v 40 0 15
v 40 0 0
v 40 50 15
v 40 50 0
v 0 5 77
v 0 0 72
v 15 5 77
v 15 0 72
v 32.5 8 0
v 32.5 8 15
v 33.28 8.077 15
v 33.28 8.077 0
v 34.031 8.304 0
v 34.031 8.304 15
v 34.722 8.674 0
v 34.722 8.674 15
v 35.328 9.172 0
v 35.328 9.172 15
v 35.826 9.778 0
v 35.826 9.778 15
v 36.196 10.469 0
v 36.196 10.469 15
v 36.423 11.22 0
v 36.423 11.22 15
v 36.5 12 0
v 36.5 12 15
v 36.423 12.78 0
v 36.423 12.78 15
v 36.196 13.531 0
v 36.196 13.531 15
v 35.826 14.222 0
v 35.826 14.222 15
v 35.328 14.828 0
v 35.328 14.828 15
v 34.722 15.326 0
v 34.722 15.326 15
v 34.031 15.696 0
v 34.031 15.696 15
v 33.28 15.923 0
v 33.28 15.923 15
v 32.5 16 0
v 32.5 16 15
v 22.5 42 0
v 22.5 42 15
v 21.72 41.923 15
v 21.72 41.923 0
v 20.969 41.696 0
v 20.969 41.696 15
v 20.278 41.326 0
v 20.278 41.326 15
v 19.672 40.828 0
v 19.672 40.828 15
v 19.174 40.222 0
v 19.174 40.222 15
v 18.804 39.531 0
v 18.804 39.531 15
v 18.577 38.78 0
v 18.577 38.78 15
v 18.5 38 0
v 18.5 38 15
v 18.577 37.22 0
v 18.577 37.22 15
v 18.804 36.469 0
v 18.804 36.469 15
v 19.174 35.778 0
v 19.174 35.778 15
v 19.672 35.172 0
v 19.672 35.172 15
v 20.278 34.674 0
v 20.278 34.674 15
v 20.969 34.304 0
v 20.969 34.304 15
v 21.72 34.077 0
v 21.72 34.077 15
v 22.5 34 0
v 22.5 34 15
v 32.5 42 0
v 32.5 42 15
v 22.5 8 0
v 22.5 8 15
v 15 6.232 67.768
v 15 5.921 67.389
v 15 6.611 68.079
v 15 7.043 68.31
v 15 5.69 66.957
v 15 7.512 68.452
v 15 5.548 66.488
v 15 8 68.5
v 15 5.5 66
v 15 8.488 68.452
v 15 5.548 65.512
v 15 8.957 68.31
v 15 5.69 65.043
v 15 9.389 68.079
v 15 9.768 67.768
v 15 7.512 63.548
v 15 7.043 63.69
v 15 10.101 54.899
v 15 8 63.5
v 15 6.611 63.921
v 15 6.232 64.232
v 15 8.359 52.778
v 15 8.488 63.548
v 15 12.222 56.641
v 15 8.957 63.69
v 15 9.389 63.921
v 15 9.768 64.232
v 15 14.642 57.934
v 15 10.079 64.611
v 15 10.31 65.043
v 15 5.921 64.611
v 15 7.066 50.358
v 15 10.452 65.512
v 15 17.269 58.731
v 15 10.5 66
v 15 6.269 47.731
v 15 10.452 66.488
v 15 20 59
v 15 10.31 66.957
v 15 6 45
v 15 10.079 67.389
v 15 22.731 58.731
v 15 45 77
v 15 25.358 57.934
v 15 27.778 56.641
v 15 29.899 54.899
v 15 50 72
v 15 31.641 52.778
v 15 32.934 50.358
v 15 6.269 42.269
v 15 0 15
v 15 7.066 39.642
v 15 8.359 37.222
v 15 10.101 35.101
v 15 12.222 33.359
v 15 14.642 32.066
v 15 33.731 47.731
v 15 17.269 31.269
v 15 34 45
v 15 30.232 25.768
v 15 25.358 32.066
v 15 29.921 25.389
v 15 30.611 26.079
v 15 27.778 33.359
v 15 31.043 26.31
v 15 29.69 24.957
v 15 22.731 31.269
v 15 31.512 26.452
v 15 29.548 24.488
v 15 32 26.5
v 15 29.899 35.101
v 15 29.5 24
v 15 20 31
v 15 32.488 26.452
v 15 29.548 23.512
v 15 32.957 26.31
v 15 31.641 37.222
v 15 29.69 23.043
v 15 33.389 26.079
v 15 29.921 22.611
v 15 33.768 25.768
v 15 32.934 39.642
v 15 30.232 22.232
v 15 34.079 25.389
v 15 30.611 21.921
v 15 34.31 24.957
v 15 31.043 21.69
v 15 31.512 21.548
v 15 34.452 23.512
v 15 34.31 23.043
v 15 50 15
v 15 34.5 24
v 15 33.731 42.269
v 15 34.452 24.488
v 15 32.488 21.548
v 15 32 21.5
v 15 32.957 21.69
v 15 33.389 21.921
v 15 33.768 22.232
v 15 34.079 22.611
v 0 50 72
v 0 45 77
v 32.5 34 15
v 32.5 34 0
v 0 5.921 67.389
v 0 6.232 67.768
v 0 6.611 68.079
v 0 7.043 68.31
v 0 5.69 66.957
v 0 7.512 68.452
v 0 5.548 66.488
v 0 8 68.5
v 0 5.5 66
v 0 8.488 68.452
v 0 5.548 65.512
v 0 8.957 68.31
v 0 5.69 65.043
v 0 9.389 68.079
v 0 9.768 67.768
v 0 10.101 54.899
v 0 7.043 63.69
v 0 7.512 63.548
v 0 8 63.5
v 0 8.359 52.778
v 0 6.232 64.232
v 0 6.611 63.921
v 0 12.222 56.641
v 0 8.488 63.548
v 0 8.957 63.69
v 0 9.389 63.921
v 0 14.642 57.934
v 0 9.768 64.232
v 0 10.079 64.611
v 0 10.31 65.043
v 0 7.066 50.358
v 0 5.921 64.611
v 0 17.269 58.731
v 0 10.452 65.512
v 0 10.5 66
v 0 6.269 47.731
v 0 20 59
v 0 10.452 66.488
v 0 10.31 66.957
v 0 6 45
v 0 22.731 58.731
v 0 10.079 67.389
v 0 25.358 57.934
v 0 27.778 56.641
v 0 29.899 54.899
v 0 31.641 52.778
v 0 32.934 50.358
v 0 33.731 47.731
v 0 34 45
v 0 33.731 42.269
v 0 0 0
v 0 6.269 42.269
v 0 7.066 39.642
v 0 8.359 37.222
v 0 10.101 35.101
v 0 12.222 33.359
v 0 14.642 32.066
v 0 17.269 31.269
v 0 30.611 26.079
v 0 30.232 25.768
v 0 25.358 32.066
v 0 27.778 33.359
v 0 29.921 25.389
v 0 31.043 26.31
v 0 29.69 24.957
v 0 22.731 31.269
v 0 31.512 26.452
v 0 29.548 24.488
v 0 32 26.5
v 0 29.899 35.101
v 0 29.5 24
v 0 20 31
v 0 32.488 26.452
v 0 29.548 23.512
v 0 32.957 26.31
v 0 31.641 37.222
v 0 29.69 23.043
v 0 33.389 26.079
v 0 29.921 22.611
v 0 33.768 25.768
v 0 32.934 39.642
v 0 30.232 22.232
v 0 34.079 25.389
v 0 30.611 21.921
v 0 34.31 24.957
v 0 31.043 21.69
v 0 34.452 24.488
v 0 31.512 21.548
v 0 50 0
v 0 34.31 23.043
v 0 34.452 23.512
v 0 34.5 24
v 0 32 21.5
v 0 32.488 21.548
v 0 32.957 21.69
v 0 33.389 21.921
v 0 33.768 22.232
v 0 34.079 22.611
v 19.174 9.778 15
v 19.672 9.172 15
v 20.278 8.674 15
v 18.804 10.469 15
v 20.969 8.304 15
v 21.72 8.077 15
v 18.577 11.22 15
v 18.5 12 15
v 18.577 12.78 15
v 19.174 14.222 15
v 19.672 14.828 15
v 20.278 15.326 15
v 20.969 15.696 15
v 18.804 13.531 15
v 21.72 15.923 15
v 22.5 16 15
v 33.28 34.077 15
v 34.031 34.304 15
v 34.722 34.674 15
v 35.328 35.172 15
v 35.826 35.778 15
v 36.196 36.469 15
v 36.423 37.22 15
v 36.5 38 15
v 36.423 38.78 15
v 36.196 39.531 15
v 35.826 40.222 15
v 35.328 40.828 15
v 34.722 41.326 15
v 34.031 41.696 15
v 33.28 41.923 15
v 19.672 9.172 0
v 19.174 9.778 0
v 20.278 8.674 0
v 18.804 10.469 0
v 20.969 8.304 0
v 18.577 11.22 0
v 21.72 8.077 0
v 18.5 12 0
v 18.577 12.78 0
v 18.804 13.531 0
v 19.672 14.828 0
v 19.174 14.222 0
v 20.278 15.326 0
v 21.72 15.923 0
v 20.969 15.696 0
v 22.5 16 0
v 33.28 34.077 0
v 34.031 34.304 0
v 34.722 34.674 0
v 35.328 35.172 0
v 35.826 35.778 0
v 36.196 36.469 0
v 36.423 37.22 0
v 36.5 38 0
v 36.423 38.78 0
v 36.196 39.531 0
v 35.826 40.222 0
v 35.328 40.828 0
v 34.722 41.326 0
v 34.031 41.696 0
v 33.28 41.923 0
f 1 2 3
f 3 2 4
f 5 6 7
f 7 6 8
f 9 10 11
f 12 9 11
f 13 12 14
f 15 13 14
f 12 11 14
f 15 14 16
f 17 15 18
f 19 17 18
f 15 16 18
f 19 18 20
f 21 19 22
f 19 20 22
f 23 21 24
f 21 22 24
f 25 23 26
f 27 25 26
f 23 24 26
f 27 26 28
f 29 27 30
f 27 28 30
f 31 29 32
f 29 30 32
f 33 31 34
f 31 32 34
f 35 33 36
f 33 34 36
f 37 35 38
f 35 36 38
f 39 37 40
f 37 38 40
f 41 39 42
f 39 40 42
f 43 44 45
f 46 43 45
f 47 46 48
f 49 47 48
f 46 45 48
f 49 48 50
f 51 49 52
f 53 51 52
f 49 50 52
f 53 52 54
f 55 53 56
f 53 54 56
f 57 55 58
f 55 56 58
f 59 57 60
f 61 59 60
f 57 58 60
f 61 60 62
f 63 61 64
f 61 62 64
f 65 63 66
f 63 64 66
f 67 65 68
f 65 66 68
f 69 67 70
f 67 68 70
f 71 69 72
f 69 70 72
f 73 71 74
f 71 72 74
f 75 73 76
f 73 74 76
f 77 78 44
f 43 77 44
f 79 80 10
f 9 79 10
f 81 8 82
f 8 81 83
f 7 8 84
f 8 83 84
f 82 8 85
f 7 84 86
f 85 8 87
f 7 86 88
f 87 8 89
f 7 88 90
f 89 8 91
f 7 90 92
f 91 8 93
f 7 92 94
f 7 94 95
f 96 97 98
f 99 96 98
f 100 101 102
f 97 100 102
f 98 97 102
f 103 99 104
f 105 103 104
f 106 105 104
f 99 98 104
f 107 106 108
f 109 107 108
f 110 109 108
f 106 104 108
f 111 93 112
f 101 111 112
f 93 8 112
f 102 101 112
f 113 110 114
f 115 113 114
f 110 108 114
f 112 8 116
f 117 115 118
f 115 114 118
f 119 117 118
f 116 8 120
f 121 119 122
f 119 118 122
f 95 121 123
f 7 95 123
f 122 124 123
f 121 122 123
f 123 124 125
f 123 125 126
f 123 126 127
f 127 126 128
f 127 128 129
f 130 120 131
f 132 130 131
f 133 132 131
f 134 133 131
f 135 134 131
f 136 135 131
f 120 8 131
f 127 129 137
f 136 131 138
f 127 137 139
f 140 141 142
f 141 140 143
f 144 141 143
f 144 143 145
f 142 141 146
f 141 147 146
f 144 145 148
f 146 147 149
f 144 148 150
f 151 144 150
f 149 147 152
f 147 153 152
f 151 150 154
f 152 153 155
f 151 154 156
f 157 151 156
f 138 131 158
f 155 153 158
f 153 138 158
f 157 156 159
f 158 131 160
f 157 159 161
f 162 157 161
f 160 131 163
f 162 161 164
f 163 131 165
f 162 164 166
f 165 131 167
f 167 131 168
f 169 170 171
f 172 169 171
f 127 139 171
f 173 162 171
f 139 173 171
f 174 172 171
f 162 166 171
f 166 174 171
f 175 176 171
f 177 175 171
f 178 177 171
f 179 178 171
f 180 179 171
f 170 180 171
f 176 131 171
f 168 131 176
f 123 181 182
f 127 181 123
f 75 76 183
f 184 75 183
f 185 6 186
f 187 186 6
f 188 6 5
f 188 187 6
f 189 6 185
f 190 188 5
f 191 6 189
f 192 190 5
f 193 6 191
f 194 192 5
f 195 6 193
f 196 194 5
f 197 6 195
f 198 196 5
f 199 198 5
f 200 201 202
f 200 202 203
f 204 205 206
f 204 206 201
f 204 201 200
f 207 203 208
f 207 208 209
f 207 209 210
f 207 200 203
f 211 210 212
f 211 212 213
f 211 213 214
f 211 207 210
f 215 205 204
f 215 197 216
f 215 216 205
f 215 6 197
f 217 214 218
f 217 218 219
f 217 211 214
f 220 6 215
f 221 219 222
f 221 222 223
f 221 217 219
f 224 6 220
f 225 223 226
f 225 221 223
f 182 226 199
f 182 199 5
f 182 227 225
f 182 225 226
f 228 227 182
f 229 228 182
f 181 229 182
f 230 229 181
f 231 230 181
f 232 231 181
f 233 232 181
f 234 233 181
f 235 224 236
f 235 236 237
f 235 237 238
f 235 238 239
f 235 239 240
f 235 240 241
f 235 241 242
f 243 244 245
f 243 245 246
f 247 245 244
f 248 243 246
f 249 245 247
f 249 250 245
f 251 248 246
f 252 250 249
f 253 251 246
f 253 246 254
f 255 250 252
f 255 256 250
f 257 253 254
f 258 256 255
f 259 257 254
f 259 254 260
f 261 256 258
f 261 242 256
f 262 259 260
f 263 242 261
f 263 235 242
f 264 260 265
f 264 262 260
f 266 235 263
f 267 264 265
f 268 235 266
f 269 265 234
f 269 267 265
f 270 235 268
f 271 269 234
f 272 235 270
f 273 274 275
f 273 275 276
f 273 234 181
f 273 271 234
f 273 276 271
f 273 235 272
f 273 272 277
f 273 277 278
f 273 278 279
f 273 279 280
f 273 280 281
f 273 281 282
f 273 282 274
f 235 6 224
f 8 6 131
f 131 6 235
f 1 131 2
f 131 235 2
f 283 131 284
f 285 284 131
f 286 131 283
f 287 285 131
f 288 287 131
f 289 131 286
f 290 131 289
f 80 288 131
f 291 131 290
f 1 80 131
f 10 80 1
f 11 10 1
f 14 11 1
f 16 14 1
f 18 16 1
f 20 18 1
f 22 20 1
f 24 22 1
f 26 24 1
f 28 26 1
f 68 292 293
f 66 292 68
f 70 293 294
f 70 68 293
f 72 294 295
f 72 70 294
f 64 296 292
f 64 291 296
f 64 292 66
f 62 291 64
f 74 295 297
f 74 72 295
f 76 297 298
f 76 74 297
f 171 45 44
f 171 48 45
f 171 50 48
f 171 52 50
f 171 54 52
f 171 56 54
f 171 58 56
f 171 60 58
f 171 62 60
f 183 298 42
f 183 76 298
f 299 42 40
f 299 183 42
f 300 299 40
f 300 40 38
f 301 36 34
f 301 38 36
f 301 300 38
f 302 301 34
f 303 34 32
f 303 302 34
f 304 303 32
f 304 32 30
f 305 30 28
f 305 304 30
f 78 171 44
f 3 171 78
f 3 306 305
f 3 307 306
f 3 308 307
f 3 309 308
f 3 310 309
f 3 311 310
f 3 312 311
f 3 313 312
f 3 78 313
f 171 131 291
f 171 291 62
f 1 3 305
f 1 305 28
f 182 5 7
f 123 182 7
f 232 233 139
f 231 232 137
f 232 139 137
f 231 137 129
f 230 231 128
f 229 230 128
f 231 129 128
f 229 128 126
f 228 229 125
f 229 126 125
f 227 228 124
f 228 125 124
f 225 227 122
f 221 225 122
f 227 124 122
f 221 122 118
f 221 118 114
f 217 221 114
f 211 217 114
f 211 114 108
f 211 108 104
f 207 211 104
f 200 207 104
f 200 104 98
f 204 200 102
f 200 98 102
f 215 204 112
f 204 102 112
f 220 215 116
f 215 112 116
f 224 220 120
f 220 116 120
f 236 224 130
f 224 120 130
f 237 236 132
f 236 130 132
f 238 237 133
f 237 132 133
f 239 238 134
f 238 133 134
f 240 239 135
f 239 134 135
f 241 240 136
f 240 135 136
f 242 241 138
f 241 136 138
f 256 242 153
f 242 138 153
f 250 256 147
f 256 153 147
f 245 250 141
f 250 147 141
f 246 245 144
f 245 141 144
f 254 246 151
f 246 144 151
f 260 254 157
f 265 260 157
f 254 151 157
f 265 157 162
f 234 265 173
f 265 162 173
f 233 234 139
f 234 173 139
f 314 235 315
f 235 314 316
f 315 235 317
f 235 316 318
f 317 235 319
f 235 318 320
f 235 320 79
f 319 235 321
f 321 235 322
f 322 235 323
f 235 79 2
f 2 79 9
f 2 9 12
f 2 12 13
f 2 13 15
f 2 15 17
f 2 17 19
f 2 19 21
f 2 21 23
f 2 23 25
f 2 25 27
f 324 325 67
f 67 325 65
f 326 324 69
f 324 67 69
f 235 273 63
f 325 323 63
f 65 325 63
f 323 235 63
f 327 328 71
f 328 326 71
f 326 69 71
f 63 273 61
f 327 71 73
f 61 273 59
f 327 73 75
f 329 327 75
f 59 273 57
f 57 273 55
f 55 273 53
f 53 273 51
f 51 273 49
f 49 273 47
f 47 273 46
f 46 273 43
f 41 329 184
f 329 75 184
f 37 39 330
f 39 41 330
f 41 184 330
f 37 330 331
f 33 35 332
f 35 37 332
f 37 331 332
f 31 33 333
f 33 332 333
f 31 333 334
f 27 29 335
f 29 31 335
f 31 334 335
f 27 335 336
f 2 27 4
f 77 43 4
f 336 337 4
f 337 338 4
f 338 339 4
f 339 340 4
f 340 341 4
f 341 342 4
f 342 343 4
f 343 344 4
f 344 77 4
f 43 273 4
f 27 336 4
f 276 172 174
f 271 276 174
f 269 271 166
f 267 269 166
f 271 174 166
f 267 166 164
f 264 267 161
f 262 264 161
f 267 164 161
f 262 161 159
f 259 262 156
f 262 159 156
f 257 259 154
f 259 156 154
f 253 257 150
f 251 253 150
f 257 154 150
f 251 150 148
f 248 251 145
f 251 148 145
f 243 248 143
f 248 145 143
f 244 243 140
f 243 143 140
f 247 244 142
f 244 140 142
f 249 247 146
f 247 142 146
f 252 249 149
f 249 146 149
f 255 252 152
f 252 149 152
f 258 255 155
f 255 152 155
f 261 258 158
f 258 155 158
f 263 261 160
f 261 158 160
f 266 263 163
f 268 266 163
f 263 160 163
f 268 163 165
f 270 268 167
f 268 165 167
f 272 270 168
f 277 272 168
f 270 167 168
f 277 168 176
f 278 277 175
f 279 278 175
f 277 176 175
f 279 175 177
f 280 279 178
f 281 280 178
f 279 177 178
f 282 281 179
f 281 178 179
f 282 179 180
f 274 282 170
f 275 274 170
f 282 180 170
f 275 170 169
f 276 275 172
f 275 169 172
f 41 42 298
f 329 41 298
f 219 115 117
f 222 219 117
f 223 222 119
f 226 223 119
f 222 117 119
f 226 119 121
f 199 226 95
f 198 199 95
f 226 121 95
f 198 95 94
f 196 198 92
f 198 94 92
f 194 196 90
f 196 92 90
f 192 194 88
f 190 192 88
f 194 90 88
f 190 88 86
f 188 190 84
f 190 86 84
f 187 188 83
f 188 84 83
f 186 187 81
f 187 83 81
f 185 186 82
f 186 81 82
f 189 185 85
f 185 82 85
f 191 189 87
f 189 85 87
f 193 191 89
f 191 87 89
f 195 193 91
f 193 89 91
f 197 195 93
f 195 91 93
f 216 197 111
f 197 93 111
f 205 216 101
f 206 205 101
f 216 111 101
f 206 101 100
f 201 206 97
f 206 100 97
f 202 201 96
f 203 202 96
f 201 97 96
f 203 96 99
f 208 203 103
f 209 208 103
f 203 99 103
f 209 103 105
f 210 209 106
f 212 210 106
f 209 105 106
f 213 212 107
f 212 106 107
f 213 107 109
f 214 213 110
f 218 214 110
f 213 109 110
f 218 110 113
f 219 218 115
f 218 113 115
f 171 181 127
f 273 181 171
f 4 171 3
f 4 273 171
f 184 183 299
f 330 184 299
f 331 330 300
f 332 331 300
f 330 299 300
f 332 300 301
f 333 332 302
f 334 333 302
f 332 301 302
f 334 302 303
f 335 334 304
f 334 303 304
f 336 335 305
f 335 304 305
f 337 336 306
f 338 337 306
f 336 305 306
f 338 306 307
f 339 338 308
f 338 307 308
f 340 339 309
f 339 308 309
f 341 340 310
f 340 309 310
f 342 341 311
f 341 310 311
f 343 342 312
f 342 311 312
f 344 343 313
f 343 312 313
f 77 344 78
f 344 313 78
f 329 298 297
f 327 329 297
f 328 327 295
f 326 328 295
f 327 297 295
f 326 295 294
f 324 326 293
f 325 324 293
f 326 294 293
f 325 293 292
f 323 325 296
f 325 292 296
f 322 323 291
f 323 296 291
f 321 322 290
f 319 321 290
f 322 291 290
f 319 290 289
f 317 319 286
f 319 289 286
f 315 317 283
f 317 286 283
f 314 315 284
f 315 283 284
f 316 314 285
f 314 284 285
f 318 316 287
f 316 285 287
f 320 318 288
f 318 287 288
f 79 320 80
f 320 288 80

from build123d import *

# Parameters (mm, degrees)
F0_W      = 40
F0_H      = 50
F1_DEPTH  = 15
F2_W      = 15
F2_H      = 50
F3_DEPTH  = 62
F4_R      = 14
F5_DEPTH  = 15
F6_SIZE   = 5
F7_R      = 2.5
F8_DEPTH  = 15
F10_DEPTH = 15


with BuildPart() as f1:
    # F0 (on Top) → F1 (new body)
    with BuildSketch(Plane.XY):
        with Locations((20, 25)):
            Rectangle(F0_W, F0_H)
    extrude(amount=F1_DEPTH)

    # F2 (on face) → F3 (join)
    with BuildSketch(Plane.XY.offset(15)):
        with Locations((7.5, 25)):
            Rectangle(F2_W, F2_H)
    extrude(amount=F3_DEPTH)

    # F4 (on face) → F5 (cut, through all)
    with BuildSketch(Plane.YZ.offset(15)):
        with Locations((20, 45)):
            Circle(F4_R)
    extrude(amount=-F5_DEPTH, mode=Mode.SUBTRACT)

    # F6
    f6_edges = [f1.edges().sort_by_distance(p)[0] for p in [
        (7.5, 50, 77),
        (7.5, 0, 77),
    ]]
    chamfer(f6_edges, length=F6_SIZE)

    # F7 (on face) → F8 (cut, through all)
    with BuildSketch(Plane.YZ.offset(15)):
        with Locations((8, 66)):
            Circle(F7_R)
        with Locations((32, 24)):
            Circle(F7_R)
    extrude(amount=-F8_DEPTH, mode=Mode.SUBTRACT)

    # F9 (on face) → F10 (cut, through all)
    with BuildSketch(Plane.XY.offset(15)):
        with BuildLine():
            Line((32.5, 42), (22.5, 42))
            ThreePointArc((22.5, 42), (18.5, 38), (22.5, 34))
            Line((22.5, 34), (32.5, 34))
            ThreePointArc((32.5, 34), (36.5, 38), (32.5, 42))
        make_face()
        with BuildLine():
            Line((32.5, 16), (22.5, 16))
            ThreePointArc((22.5, 16), (18.5, 12), (22.5, 8))
            Line((22.5, 8), (32.5, 8))
            ThreePointArc((32.5, 8), (36.5, 12), (32.5, 16))
        make_face()
    extrude(amount=-F10_DEPTH, mode=Mode.SUBTRACT)


solid = f1.part
